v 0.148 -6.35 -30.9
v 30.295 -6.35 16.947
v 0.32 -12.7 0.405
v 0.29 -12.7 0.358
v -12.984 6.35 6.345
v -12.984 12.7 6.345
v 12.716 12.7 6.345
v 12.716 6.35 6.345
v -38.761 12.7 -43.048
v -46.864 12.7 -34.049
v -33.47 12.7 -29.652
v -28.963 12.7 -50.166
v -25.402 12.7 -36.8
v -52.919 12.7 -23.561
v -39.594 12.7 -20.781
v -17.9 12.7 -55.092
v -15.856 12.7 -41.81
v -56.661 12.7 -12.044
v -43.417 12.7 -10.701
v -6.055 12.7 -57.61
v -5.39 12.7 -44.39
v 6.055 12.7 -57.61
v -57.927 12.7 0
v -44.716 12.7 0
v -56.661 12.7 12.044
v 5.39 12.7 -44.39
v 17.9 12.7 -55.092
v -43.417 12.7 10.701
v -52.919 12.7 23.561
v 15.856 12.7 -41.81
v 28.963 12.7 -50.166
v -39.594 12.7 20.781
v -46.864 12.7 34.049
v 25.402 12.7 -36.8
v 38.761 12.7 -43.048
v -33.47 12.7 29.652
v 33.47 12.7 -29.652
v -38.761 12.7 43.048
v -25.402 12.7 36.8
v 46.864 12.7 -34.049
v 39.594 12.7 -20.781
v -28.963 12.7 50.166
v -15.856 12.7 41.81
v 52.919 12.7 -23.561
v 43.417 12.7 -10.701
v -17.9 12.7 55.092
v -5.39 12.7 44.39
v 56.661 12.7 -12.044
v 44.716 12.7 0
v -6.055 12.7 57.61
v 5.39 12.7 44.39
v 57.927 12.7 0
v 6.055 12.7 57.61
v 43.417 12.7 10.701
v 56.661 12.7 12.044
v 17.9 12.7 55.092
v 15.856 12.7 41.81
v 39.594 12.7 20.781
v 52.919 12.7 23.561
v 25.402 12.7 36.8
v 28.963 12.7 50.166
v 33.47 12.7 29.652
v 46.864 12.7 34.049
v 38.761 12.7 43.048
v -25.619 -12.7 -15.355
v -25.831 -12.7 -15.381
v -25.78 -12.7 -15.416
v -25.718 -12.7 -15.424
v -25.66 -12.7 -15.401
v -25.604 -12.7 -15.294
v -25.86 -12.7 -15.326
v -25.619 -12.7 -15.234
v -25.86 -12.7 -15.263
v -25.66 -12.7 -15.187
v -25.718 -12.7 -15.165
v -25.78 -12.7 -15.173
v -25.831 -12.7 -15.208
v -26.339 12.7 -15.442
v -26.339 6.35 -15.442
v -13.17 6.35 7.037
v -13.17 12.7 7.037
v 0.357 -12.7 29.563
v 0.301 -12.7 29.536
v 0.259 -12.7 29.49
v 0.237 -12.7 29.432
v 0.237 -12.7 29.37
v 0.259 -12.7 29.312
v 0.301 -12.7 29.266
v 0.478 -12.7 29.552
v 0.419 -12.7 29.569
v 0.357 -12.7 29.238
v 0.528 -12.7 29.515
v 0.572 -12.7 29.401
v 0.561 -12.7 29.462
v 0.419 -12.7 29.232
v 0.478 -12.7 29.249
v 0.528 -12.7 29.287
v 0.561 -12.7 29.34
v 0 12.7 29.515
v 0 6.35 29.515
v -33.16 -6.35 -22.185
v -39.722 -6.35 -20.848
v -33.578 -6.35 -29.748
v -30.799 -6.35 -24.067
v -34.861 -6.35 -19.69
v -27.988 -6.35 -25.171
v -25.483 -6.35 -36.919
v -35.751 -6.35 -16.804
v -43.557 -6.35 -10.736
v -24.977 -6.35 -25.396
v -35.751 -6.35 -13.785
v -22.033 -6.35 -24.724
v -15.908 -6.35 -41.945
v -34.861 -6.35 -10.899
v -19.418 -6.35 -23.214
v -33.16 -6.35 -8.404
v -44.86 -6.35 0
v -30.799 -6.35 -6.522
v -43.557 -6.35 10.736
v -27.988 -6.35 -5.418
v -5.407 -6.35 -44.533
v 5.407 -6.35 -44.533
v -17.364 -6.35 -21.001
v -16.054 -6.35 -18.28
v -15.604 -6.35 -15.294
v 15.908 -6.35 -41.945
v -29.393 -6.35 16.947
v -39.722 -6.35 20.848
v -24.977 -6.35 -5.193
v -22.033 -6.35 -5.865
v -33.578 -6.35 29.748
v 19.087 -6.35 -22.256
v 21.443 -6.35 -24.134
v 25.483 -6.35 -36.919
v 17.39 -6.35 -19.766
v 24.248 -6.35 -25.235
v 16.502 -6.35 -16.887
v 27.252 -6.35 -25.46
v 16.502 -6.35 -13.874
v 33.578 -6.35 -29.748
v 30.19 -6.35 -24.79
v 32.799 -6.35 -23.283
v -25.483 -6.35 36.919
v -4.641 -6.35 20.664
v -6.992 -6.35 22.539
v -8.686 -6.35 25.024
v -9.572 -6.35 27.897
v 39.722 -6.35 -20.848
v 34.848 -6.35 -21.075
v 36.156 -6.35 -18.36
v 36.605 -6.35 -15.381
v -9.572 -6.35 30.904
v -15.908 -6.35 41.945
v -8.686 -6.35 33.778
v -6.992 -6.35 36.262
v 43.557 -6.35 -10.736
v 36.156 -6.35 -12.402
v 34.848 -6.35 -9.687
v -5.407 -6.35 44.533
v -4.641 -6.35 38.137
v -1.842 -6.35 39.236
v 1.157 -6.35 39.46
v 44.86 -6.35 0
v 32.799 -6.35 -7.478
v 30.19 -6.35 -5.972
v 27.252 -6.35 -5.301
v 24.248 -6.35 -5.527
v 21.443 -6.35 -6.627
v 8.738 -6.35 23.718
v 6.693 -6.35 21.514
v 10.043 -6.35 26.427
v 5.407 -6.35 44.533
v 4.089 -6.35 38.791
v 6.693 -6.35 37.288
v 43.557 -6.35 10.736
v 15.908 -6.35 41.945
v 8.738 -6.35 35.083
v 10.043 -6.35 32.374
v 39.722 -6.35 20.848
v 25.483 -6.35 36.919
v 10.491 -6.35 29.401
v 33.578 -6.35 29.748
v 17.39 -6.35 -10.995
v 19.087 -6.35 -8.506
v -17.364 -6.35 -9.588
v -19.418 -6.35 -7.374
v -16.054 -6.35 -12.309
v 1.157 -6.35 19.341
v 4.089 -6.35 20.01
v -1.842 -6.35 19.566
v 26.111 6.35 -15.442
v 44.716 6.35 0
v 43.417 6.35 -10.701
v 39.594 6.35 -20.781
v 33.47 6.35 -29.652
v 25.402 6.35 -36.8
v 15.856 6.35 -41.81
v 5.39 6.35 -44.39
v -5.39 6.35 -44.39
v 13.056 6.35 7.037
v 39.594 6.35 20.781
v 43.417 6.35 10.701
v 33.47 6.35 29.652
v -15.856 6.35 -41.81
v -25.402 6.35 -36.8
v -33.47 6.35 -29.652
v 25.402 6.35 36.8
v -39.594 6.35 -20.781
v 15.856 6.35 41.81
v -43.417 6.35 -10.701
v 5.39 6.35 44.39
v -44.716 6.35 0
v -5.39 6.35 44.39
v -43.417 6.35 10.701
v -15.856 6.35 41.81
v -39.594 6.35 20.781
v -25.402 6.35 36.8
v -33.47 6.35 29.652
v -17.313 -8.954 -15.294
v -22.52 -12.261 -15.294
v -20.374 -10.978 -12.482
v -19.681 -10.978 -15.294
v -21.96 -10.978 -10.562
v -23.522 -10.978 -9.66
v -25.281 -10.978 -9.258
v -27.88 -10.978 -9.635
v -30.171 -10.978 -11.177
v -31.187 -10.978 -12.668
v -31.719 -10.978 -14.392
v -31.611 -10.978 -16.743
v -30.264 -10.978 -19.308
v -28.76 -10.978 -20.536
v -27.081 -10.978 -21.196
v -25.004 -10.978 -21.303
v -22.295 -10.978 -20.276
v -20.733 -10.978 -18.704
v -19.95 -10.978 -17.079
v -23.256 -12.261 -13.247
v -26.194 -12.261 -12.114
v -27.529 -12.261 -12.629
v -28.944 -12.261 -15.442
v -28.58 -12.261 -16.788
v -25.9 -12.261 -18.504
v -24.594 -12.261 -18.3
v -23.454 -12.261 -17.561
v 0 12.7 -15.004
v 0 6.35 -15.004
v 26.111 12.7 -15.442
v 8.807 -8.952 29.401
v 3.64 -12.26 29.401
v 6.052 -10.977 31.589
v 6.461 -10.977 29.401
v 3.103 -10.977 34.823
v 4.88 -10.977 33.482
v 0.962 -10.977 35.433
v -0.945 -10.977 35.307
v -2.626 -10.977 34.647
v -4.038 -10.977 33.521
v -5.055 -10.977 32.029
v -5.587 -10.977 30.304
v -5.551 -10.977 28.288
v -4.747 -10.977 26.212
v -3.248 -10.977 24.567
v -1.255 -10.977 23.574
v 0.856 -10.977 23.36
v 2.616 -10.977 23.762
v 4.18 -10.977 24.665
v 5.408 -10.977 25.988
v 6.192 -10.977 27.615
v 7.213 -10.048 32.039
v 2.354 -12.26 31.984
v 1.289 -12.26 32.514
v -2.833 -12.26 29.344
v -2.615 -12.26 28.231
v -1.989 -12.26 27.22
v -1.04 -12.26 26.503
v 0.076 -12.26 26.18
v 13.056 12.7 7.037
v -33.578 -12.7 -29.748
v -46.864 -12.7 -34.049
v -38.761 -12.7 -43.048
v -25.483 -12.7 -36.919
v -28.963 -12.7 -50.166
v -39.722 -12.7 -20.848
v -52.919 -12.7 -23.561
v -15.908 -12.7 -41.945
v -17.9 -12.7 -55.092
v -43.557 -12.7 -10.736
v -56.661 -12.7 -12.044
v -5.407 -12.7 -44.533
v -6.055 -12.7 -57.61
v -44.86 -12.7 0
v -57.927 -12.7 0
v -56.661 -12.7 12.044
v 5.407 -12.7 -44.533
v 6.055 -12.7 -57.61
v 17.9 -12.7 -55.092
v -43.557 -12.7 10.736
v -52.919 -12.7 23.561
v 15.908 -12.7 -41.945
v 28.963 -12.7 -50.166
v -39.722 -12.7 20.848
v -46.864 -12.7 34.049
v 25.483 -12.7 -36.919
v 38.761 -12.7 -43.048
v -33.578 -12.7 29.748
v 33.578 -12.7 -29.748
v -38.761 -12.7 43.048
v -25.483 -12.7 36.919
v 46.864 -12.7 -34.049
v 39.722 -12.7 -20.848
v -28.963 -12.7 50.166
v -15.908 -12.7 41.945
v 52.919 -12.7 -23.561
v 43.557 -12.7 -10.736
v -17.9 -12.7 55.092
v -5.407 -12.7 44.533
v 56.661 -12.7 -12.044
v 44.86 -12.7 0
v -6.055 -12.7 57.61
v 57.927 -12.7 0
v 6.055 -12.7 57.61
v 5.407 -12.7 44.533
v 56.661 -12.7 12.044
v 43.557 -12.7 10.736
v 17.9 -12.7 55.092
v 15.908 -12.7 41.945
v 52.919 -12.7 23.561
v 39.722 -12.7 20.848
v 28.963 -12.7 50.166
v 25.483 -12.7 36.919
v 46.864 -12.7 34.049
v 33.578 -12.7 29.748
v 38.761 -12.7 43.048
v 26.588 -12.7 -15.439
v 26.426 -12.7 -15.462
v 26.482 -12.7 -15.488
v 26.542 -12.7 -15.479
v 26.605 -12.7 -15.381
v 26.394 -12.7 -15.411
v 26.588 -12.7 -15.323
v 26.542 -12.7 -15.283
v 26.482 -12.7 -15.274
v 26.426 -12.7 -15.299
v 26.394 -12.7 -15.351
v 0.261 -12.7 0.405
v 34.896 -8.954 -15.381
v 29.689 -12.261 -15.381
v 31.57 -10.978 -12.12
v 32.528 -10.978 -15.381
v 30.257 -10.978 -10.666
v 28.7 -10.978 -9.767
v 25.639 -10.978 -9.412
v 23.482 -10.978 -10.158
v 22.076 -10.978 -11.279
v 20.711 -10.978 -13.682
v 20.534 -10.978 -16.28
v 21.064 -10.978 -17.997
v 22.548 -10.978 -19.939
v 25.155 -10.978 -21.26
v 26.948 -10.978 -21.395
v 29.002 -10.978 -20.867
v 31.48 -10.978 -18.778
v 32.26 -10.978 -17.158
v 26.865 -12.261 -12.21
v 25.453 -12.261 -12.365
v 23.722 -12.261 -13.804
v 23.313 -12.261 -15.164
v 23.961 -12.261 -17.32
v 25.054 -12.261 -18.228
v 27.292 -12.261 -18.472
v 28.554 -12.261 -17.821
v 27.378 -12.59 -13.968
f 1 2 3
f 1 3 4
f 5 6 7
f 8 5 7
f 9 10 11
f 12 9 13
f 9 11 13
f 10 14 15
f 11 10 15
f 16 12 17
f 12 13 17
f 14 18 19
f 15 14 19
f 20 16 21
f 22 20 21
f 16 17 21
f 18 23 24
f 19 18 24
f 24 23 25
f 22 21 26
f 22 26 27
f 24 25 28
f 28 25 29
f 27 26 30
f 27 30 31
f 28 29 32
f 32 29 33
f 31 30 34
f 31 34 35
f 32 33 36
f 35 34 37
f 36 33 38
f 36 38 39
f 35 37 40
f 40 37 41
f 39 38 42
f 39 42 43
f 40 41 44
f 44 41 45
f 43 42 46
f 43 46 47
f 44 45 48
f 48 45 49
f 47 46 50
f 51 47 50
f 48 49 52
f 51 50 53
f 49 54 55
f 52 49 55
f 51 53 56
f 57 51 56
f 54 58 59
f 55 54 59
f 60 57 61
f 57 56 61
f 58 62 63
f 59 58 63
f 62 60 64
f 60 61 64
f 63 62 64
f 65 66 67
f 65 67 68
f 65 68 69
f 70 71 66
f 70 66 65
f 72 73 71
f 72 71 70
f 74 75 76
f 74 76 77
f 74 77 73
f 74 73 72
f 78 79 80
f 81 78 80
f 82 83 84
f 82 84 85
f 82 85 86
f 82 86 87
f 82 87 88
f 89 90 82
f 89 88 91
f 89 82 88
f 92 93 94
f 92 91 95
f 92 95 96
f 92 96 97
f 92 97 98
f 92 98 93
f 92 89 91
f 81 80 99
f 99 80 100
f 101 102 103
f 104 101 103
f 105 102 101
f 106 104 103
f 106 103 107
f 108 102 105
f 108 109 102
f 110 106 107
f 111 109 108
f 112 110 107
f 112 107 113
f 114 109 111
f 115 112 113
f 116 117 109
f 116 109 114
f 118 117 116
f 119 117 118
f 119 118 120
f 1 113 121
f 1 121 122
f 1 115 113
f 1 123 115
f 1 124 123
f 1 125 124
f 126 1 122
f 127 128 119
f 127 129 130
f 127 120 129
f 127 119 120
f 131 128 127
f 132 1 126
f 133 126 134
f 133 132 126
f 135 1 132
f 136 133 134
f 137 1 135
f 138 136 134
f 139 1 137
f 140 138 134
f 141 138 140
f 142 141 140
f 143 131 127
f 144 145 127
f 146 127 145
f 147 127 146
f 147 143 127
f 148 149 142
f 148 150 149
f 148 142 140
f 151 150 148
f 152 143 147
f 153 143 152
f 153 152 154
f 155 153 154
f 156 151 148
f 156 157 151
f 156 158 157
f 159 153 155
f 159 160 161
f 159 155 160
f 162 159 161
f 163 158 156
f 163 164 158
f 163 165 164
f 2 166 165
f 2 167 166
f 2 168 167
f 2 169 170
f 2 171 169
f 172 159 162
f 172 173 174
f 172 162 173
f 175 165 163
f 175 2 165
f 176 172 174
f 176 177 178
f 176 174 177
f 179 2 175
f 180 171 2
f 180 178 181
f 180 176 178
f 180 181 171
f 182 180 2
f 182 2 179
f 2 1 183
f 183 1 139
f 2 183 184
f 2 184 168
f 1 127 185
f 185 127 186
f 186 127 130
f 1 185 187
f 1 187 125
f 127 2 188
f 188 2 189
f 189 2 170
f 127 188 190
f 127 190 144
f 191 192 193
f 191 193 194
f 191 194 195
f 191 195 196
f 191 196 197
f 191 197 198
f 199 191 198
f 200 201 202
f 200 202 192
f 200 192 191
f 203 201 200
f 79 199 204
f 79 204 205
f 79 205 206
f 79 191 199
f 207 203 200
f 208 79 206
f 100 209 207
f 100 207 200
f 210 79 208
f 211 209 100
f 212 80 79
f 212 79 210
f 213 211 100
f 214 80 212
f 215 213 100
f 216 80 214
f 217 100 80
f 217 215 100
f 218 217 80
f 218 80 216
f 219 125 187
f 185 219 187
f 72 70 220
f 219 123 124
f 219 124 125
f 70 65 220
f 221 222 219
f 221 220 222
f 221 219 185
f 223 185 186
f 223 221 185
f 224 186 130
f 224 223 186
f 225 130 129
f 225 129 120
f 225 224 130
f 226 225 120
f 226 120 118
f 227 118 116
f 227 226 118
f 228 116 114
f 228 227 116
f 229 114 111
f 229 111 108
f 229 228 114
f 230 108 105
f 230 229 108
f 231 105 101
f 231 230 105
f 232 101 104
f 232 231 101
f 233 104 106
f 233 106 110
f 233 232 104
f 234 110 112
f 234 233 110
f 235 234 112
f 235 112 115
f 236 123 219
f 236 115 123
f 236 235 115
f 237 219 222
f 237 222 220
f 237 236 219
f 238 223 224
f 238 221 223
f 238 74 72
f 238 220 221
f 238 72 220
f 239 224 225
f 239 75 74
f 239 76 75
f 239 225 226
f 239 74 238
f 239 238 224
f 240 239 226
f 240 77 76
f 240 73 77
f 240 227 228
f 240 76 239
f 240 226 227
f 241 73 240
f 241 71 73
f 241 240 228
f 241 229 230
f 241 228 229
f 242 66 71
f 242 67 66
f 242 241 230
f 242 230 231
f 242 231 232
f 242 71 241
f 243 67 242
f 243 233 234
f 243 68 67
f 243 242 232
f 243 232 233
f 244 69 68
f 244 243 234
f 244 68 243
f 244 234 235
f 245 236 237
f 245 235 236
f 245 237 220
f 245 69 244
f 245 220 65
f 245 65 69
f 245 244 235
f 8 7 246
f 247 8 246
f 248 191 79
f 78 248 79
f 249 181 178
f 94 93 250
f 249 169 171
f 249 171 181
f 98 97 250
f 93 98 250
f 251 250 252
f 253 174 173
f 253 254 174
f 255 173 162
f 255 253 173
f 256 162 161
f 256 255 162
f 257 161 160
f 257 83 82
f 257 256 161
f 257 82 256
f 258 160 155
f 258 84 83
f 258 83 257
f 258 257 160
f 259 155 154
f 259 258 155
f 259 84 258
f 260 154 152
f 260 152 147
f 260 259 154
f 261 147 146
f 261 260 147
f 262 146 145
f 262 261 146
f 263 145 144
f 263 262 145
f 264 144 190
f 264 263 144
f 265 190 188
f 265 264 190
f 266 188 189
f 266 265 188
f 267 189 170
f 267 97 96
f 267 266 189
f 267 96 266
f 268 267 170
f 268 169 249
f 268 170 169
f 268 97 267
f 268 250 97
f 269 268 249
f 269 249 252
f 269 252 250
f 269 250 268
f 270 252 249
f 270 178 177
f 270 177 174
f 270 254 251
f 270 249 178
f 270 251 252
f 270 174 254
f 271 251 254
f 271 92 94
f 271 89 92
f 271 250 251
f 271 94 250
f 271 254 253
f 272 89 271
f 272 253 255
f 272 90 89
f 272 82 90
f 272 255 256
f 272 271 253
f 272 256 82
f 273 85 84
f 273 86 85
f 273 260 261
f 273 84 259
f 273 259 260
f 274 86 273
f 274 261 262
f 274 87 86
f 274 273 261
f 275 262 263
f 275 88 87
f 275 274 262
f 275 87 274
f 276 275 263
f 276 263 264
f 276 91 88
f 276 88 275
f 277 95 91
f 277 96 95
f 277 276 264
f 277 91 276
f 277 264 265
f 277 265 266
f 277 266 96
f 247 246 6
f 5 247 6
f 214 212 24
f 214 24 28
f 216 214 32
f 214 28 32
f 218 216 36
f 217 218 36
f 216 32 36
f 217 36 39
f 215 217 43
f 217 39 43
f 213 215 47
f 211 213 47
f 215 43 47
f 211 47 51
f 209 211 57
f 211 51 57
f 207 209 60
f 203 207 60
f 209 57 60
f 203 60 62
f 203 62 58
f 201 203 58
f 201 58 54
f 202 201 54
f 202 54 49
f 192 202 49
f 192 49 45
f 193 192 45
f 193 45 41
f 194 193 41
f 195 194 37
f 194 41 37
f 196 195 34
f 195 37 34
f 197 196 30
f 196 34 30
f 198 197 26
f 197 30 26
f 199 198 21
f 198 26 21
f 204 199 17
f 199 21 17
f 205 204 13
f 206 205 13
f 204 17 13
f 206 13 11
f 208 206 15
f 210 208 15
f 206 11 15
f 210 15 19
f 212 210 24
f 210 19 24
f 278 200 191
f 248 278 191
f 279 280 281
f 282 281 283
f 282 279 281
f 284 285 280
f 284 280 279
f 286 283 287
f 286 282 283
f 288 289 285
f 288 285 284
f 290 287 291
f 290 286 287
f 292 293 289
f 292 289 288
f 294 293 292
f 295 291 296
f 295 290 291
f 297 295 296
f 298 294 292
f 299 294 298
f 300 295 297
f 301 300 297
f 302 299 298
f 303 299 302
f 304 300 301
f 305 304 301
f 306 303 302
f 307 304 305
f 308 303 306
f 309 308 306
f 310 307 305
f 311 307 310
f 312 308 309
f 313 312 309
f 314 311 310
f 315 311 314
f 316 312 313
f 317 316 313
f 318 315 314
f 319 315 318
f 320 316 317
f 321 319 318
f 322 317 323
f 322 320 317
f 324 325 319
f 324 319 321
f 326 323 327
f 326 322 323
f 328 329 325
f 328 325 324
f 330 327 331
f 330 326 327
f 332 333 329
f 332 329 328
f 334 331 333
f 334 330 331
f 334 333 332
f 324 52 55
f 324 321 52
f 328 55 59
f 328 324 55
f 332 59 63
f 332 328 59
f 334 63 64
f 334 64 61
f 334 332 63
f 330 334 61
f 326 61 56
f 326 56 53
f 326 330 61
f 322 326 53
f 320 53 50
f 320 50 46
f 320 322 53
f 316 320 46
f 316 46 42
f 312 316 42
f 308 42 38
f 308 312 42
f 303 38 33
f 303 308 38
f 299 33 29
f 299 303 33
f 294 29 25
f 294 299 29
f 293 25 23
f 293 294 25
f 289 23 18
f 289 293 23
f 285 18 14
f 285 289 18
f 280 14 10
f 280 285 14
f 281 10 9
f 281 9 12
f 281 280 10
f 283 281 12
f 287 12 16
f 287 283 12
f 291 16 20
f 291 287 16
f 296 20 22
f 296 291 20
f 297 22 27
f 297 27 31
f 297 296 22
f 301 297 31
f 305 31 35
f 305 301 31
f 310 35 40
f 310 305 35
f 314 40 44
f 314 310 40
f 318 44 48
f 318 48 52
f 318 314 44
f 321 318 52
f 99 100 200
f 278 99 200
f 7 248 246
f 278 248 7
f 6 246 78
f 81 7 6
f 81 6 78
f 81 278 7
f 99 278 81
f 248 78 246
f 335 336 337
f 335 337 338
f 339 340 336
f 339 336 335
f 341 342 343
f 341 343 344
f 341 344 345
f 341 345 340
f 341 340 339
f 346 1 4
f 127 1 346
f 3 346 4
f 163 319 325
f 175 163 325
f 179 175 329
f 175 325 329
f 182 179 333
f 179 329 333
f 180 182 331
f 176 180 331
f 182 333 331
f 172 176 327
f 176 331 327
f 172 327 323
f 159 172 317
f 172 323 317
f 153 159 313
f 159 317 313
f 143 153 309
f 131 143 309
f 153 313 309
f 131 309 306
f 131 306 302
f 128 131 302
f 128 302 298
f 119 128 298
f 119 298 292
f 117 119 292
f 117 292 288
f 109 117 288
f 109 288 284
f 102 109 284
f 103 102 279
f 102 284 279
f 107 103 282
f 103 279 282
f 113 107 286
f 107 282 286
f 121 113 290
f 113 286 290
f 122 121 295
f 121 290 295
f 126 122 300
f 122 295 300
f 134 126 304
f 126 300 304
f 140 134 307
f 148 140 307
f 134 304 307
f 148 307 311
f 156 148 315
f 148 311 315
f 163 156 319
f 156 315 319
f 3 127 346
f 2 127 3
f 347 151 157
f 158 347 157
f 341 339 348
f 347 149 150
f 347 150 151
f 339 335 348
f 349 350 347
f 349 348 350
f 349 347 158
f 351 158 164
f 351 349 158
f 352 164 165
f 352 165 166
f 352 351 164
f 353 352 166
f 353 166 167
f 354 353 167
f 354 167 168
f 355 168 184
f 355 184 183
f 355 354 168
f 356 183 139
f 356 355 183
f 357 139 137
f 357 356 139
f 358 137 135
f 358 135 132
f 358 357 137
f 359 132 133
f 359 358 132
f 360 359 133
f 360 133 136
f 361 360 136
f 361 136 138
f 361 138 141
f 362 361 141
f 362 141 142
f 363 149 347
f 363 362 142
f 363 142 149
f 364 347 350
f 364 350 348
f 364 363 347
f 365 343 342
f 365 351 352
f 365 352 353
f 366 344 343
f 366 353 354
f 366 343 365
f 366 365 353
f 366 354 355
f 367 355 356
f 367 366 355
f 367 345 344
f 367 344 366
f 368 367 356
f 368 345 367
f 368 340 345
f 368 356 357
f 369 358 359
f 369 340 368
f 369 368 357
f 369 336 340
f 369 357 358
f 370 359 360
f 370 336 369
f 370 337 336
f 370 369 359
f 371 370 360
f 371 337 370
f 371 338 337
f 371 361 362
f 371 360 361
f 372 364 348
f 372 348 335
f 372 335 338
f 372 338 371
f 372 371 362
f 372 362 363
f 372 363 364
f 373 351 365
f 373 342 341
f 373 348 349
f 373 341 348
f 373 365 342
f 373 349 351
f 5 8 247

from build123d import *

# Parameters (mm, degrees)
F0_R          = 57.9269385224
F0_R_2        = 45.238930614
F0_R_3        = 10.232456426
F0_R_4        = 9.9260337363
F0_R_5        = 10.3400506536
F1_DEPTH      = 12.7
F2_DEPTH      = 12.7
F3_R          = 44.8601198224
F4_DEPTH      = 6.35
F5_R          = 44.7159015694
F6_DEPTH      = 6.35
F8_DEPTH      = 6.35
F10_DEPTH     = 6.35
F11_R         = 10.0879812564
F11_R_2       = 10.1077702508
F11_R_3       = 10.130036121
F12_DEPTH     = 6.35
F16_T4_DEPTH  = 143.3938123808
F16_T11_DEPTH = 146.5521785494
F16_T18_DEPTH = 143.0711301992


# Not quite as in the source:
# - a fillet or chamfer that OpenCascade refuses, or shapes differently, is made with other operations: its cross-section is extruded or revolved along the edge and cut away or added


with BuildPart() as f1:
    # F0 (on Front) → F1 (new body)
    with BuildSketch(Plane.XZ):
        Circle(F0_R)
        Circle(F0_R_2, mode=Mode.SUBTRACT)
        Circle(F0_R_2)
        with Locations((-26.1295642704, -15.3669575229)):
            Circle(F0_R_3, mode=Mode.SUBTRACT)
        Polygon((-12.544834055, -34.5090515912), (0, -5.3877583705), (12.6424450427, -34.5090515912), align=None, mode=Mode.SUBTRACT)
        with Locations((26.1333119124, -15.1850637048)):
            Circle(F0_R_4, mode=Mode.SUBTRACT)
        Polygon((-36.0336452723, 4.8764180392), (-24.01153557, 26.9035063684), (-4.5260344632, 1.7700339667), align=None, mode=Mode.SUBTRACT)
        Polygon((36.1581519246, 4.842239432), (4.4649434276, 1.758374623), (24.0084677935, 26.875147596), align=None, mode=Mode.SUBTRACT)
        with Locations((0, 29.5979101211)):
            Circle(F0_R_5, mode=Mode.SUBTRACT)
        with Locations((0, 29.5979101211)):
            Circle(F0_R_5)
        Polygon((-4.5260344632, 1.7700339667), (-24.01153557, 26.9035063684), (-36.0336452723, 4.8764180392), align=None)
        with Locations((-26.1295642704, -15.3669575229)):
            Circle(F0_R_3)
        Polygon((12.6424450427, -34.5090515912), (0, -5.3877583705), (-12.544834055, -34.5090515912), align=None)
        with Locations((26.1333119124, -15.1850637048)):
            Circle(F0_R_4)
        Polygon((24.0084677935, 26.875147596), (4.4649434276, 1.758374623), (36.1581519246, 4.842239432), align=None)
    extrude(amount=F1_DEPTH)

    # F2 (add): a face of the model
    f2_faces = [f1.faces().sort_by_distance(p)[0] for p in [
        (0, 0, 0),
    ]]
    extrude(f2_faces, amount=F2_DEPTH)

    # F3 (on face) → F4 (cut)
    with BuildSketch(Plane.XZ.offset(12.7)):
        Circle(F3_R)
    extrude(amount=-F4_DEPTH, mode=Mode.SUBTRACT)

    # F5 (on face) → F6 (cut)
    with BuildSketch(Plane(origin=(0, 12.7, 0), x_dir=(-1, 0, 0), z_dir=(0, 1, 0))):
        Circle(F5_R)
    extrude(amount=-F6_DEPTH, mode=Mode.SUBTRACT)

    # F7 (on face) → F8 (join)
    with BuildSketch(Plane(origin=(0, 6.35, 0), x_dir=(-1, 0, 0), z_dir=(0, 1, 0))):
        Polygon((0.1139463857, -15.4419038445), (-13.0555815995, 7.0367623121), (-26.1111631989, -15.4419038445), align=None)
        Polygon((0.1139463857, -15.4419038445), (13.1695279852, 7.0367623121), (-13.0555815995, 7.0367623121), align=None)
        Polygon((13.1695279852, 7.0367623121), (0, 29.5154284686), (-13.0555815995, 7.0367623121), align=None)
        Polygon((26.3390559703, -15.4419038445), (13.1695279852, 7.0367623121), (0.1139463857, -15.4419038445), align=None)
    extrude(amount=F8_DEPTH)

    # F9 (on face) → F10 (cut)
    with BuildSketch(Plane(origin=(0, 12.7, 0), x_dir=(-1, 0, 0), z_dir=(0, 1, 0))):
        Polygon((12.9840383306, 6.3451784663), (-12.7162076533, 6.3451784663), (0, -15.0037035346), align=None)
    extrude(amount=-F10_DEPTH, mode=Mode.SUBTRACT)

    # F11 (on face) → F12 (join)
    with BuildSketch(Plane.XZ.offset(6.35)):
        with Locations((0.4030804266, 29.4006802142)):
            Circle(F11_R)
        with Locations((26.4969747514, -15.3808789328)):
            Circle(F11_R_2)
        with Locations((-25.7336739451, -15.2944726869)):
            Circle(F11_R_3)
        Polygon((0.1468855771, -31.126530841), (30.5121447891, 17.0675422996), (-29.6086445451, 17.0675422996), align=None)
    extrude(amount=F12_DEPTH)

    # F13: fillet of radius 10.922 on 1 edges, made by hand

    # F13_s1 → F13_t2 (revolve, cut)
    with BuildSketch(Plane.XY.offset(29.4006802142)):
        with BuildLine():
            ThreePointArc((10.491061683, -6.35), (6.4607923392, -10.9765180328), (0.5720445946, -12.7))
            Line((0.5720445946, -12.7), (10.491061683, -12.7))
            Line((10.491061683, -12.7), (10.491061683, -6.35))
        make_face()
    revolve(axis=Axis((0.4030804266, -12.7, 29.4006802142), (0, -1, 0)), mode=Mode.SUBTRACT)

    # F14: fillet of radius 11.049 on 1 edges, made by hand

    # F14_s1 → F14_t2 (revolve, cut)
    with BuildSketch(Plane.XY.offset(-15.2944726869)):
        with BuildLine():
            ThreePointArc((-15.6036378241, -6.35), (-19.6807421254, -10.9783697257), (-25.6036278241, -12.7))
            Line((-25.6036278241, -12.7), (-15.6036378241, -12.7))
            Line((-15.6036378241, -12.7), (-15.6036378241, -6.35))
        make_face()
    revolve(axis=Axis((-25.7336739451, -12.7, -15.2944726869), (0, -1, 0)), mode=Mode.SUBTRACT)

    # F15: fillet of radius 11.049 on 1 edges, made by hand

    # F15_s1 → F15_t2 (revolve, cut)
    with BuildSketch(Plane.XY.offset(-15.3808789328)):
        with BuildLine():
            ThreePointArc((36.6047450022, -6.35), (32.5276407009, -10.9783697257), (26.6047550022, -12.7))
            Line((26.6047550022, -12.7), (36.6047450022, -12.7))
            Line((36.6047450022, -12.7), (36.6047450022, -6.35))
        make_face()
    revolve(axis=Axis((26.4969747514, -12.7, -15.3808789328), (0, -1, 0)), mode=Mode.SUBTRACT)

    # F16: chamfer of 16.6624 x 6.3960960974 on 3 edges, made by hand


with BuildPart() as f16_tool2:
    # F16_s3 → F16_t4 (new body)
    with BuildSketch(Plane(origin=(-37.0340982639, 0, -58.7784885341), x_dir=(0, 1, 0), z_dir=(0.5330752718, 0, 0.8460678191))):
        Polygon((-6.3039039026, -16.7170590485), (-12.7, -0.0546590485), (-12.7, -16.7170590485), align=None)
    extrude(amount=F16_T4_DEPTH)

    split(bisect_by=Plane.XZ.offset(6.35), keep=Keep.TOP)

    split(bisect_by=Plane.XY.offset(17.0675422996), keep=Keep.BOTTOM)

    split(bisect_by=Plane(origin=(-13.8075741275, 0, -8.5249421991), x_dir=(0, 1, 0), z_dir=(0.8508879508, 0, 0.5253472139)), keep=Keep.TOP)


with BuildPart() as f1_1:
    add(f1.part)

    # F16_t1: cut F16_tool2
    add(f16_tool2.part, mode=Mode.SUBTRACT)


with BuildPart() as f16_tool9:
    # F16_s10 → F16_t11 (new body)
    with BuildSketch(Plane.YZ.offset(73.7278393967)):
        Polygon((-6.3039039026, 17.0675422996), (-12.7, 0.4051422996), (-12.7, 17.0675422996), align=None)
    extrude(amount=-F16_T11_DEPTH)

    split(bisect_by=Plane.XZ.offset(6.35), keep=Keep.TOP)

    split(bisect_by=Plane(origin=(14.1437656916, 0, -8.9114507961), x_dir=(0, 1, 0), z_dir=(-0.8460678191, 0, 0.5330752718)), keep=Keep.TOP)

    split(bisect_by=Plane(origin=(-13.8075741275, 0, -8.5249421991), x_dir=(0, 1, 0), z_dir=(0.8508879508, 0, 0.5253472139)), keep=Keep.TOP)


with BuildPart() as f1_2:
    add(f1_1.part)

    # F16_t8: cut F16_tool9
    add(f16_tool9.part, mode=Mode.SUBTRACT)


with BuildPart() as f16_tool16:
    # F16_s17 → F16_t18 (new body)
    with BuildSketch(Plane(origin=(-38.5043151766, 0, 62.3641983265), x_dir=(0, 1, 0), z_dir=(0.5253472139, 0, -0.8508879508))):
        Polygon((-6.3039039026, -16.2272530881), (-12.7, 0.4351469119), (-12.7, -16.2272530881), align=None)
    extrude(amount=F16_T18_DEPTH)

    split(bisect_by=Plane.XZ.offset(6.35), keep=Keep.TOP)

    split(bisect_by=Plane(origin=(14.1437656916, 0, -8.9114507961), x_dir=(0, 1, 0), z_dir=(-0.8460678191, 0, 0.5330752718)), keep=Keep.TOP)

    split(bisect_by=Plane.XY.offset(17.0675422996), keep=Keep.BOTTOM)


with BuildPart() as f1_3:
    add(f1_2.part)

    # F16_t15: cut F16_tool16
    add(f16_tool16.part, mode=Mode.SUBTRACT)


solid = f1_3.part
